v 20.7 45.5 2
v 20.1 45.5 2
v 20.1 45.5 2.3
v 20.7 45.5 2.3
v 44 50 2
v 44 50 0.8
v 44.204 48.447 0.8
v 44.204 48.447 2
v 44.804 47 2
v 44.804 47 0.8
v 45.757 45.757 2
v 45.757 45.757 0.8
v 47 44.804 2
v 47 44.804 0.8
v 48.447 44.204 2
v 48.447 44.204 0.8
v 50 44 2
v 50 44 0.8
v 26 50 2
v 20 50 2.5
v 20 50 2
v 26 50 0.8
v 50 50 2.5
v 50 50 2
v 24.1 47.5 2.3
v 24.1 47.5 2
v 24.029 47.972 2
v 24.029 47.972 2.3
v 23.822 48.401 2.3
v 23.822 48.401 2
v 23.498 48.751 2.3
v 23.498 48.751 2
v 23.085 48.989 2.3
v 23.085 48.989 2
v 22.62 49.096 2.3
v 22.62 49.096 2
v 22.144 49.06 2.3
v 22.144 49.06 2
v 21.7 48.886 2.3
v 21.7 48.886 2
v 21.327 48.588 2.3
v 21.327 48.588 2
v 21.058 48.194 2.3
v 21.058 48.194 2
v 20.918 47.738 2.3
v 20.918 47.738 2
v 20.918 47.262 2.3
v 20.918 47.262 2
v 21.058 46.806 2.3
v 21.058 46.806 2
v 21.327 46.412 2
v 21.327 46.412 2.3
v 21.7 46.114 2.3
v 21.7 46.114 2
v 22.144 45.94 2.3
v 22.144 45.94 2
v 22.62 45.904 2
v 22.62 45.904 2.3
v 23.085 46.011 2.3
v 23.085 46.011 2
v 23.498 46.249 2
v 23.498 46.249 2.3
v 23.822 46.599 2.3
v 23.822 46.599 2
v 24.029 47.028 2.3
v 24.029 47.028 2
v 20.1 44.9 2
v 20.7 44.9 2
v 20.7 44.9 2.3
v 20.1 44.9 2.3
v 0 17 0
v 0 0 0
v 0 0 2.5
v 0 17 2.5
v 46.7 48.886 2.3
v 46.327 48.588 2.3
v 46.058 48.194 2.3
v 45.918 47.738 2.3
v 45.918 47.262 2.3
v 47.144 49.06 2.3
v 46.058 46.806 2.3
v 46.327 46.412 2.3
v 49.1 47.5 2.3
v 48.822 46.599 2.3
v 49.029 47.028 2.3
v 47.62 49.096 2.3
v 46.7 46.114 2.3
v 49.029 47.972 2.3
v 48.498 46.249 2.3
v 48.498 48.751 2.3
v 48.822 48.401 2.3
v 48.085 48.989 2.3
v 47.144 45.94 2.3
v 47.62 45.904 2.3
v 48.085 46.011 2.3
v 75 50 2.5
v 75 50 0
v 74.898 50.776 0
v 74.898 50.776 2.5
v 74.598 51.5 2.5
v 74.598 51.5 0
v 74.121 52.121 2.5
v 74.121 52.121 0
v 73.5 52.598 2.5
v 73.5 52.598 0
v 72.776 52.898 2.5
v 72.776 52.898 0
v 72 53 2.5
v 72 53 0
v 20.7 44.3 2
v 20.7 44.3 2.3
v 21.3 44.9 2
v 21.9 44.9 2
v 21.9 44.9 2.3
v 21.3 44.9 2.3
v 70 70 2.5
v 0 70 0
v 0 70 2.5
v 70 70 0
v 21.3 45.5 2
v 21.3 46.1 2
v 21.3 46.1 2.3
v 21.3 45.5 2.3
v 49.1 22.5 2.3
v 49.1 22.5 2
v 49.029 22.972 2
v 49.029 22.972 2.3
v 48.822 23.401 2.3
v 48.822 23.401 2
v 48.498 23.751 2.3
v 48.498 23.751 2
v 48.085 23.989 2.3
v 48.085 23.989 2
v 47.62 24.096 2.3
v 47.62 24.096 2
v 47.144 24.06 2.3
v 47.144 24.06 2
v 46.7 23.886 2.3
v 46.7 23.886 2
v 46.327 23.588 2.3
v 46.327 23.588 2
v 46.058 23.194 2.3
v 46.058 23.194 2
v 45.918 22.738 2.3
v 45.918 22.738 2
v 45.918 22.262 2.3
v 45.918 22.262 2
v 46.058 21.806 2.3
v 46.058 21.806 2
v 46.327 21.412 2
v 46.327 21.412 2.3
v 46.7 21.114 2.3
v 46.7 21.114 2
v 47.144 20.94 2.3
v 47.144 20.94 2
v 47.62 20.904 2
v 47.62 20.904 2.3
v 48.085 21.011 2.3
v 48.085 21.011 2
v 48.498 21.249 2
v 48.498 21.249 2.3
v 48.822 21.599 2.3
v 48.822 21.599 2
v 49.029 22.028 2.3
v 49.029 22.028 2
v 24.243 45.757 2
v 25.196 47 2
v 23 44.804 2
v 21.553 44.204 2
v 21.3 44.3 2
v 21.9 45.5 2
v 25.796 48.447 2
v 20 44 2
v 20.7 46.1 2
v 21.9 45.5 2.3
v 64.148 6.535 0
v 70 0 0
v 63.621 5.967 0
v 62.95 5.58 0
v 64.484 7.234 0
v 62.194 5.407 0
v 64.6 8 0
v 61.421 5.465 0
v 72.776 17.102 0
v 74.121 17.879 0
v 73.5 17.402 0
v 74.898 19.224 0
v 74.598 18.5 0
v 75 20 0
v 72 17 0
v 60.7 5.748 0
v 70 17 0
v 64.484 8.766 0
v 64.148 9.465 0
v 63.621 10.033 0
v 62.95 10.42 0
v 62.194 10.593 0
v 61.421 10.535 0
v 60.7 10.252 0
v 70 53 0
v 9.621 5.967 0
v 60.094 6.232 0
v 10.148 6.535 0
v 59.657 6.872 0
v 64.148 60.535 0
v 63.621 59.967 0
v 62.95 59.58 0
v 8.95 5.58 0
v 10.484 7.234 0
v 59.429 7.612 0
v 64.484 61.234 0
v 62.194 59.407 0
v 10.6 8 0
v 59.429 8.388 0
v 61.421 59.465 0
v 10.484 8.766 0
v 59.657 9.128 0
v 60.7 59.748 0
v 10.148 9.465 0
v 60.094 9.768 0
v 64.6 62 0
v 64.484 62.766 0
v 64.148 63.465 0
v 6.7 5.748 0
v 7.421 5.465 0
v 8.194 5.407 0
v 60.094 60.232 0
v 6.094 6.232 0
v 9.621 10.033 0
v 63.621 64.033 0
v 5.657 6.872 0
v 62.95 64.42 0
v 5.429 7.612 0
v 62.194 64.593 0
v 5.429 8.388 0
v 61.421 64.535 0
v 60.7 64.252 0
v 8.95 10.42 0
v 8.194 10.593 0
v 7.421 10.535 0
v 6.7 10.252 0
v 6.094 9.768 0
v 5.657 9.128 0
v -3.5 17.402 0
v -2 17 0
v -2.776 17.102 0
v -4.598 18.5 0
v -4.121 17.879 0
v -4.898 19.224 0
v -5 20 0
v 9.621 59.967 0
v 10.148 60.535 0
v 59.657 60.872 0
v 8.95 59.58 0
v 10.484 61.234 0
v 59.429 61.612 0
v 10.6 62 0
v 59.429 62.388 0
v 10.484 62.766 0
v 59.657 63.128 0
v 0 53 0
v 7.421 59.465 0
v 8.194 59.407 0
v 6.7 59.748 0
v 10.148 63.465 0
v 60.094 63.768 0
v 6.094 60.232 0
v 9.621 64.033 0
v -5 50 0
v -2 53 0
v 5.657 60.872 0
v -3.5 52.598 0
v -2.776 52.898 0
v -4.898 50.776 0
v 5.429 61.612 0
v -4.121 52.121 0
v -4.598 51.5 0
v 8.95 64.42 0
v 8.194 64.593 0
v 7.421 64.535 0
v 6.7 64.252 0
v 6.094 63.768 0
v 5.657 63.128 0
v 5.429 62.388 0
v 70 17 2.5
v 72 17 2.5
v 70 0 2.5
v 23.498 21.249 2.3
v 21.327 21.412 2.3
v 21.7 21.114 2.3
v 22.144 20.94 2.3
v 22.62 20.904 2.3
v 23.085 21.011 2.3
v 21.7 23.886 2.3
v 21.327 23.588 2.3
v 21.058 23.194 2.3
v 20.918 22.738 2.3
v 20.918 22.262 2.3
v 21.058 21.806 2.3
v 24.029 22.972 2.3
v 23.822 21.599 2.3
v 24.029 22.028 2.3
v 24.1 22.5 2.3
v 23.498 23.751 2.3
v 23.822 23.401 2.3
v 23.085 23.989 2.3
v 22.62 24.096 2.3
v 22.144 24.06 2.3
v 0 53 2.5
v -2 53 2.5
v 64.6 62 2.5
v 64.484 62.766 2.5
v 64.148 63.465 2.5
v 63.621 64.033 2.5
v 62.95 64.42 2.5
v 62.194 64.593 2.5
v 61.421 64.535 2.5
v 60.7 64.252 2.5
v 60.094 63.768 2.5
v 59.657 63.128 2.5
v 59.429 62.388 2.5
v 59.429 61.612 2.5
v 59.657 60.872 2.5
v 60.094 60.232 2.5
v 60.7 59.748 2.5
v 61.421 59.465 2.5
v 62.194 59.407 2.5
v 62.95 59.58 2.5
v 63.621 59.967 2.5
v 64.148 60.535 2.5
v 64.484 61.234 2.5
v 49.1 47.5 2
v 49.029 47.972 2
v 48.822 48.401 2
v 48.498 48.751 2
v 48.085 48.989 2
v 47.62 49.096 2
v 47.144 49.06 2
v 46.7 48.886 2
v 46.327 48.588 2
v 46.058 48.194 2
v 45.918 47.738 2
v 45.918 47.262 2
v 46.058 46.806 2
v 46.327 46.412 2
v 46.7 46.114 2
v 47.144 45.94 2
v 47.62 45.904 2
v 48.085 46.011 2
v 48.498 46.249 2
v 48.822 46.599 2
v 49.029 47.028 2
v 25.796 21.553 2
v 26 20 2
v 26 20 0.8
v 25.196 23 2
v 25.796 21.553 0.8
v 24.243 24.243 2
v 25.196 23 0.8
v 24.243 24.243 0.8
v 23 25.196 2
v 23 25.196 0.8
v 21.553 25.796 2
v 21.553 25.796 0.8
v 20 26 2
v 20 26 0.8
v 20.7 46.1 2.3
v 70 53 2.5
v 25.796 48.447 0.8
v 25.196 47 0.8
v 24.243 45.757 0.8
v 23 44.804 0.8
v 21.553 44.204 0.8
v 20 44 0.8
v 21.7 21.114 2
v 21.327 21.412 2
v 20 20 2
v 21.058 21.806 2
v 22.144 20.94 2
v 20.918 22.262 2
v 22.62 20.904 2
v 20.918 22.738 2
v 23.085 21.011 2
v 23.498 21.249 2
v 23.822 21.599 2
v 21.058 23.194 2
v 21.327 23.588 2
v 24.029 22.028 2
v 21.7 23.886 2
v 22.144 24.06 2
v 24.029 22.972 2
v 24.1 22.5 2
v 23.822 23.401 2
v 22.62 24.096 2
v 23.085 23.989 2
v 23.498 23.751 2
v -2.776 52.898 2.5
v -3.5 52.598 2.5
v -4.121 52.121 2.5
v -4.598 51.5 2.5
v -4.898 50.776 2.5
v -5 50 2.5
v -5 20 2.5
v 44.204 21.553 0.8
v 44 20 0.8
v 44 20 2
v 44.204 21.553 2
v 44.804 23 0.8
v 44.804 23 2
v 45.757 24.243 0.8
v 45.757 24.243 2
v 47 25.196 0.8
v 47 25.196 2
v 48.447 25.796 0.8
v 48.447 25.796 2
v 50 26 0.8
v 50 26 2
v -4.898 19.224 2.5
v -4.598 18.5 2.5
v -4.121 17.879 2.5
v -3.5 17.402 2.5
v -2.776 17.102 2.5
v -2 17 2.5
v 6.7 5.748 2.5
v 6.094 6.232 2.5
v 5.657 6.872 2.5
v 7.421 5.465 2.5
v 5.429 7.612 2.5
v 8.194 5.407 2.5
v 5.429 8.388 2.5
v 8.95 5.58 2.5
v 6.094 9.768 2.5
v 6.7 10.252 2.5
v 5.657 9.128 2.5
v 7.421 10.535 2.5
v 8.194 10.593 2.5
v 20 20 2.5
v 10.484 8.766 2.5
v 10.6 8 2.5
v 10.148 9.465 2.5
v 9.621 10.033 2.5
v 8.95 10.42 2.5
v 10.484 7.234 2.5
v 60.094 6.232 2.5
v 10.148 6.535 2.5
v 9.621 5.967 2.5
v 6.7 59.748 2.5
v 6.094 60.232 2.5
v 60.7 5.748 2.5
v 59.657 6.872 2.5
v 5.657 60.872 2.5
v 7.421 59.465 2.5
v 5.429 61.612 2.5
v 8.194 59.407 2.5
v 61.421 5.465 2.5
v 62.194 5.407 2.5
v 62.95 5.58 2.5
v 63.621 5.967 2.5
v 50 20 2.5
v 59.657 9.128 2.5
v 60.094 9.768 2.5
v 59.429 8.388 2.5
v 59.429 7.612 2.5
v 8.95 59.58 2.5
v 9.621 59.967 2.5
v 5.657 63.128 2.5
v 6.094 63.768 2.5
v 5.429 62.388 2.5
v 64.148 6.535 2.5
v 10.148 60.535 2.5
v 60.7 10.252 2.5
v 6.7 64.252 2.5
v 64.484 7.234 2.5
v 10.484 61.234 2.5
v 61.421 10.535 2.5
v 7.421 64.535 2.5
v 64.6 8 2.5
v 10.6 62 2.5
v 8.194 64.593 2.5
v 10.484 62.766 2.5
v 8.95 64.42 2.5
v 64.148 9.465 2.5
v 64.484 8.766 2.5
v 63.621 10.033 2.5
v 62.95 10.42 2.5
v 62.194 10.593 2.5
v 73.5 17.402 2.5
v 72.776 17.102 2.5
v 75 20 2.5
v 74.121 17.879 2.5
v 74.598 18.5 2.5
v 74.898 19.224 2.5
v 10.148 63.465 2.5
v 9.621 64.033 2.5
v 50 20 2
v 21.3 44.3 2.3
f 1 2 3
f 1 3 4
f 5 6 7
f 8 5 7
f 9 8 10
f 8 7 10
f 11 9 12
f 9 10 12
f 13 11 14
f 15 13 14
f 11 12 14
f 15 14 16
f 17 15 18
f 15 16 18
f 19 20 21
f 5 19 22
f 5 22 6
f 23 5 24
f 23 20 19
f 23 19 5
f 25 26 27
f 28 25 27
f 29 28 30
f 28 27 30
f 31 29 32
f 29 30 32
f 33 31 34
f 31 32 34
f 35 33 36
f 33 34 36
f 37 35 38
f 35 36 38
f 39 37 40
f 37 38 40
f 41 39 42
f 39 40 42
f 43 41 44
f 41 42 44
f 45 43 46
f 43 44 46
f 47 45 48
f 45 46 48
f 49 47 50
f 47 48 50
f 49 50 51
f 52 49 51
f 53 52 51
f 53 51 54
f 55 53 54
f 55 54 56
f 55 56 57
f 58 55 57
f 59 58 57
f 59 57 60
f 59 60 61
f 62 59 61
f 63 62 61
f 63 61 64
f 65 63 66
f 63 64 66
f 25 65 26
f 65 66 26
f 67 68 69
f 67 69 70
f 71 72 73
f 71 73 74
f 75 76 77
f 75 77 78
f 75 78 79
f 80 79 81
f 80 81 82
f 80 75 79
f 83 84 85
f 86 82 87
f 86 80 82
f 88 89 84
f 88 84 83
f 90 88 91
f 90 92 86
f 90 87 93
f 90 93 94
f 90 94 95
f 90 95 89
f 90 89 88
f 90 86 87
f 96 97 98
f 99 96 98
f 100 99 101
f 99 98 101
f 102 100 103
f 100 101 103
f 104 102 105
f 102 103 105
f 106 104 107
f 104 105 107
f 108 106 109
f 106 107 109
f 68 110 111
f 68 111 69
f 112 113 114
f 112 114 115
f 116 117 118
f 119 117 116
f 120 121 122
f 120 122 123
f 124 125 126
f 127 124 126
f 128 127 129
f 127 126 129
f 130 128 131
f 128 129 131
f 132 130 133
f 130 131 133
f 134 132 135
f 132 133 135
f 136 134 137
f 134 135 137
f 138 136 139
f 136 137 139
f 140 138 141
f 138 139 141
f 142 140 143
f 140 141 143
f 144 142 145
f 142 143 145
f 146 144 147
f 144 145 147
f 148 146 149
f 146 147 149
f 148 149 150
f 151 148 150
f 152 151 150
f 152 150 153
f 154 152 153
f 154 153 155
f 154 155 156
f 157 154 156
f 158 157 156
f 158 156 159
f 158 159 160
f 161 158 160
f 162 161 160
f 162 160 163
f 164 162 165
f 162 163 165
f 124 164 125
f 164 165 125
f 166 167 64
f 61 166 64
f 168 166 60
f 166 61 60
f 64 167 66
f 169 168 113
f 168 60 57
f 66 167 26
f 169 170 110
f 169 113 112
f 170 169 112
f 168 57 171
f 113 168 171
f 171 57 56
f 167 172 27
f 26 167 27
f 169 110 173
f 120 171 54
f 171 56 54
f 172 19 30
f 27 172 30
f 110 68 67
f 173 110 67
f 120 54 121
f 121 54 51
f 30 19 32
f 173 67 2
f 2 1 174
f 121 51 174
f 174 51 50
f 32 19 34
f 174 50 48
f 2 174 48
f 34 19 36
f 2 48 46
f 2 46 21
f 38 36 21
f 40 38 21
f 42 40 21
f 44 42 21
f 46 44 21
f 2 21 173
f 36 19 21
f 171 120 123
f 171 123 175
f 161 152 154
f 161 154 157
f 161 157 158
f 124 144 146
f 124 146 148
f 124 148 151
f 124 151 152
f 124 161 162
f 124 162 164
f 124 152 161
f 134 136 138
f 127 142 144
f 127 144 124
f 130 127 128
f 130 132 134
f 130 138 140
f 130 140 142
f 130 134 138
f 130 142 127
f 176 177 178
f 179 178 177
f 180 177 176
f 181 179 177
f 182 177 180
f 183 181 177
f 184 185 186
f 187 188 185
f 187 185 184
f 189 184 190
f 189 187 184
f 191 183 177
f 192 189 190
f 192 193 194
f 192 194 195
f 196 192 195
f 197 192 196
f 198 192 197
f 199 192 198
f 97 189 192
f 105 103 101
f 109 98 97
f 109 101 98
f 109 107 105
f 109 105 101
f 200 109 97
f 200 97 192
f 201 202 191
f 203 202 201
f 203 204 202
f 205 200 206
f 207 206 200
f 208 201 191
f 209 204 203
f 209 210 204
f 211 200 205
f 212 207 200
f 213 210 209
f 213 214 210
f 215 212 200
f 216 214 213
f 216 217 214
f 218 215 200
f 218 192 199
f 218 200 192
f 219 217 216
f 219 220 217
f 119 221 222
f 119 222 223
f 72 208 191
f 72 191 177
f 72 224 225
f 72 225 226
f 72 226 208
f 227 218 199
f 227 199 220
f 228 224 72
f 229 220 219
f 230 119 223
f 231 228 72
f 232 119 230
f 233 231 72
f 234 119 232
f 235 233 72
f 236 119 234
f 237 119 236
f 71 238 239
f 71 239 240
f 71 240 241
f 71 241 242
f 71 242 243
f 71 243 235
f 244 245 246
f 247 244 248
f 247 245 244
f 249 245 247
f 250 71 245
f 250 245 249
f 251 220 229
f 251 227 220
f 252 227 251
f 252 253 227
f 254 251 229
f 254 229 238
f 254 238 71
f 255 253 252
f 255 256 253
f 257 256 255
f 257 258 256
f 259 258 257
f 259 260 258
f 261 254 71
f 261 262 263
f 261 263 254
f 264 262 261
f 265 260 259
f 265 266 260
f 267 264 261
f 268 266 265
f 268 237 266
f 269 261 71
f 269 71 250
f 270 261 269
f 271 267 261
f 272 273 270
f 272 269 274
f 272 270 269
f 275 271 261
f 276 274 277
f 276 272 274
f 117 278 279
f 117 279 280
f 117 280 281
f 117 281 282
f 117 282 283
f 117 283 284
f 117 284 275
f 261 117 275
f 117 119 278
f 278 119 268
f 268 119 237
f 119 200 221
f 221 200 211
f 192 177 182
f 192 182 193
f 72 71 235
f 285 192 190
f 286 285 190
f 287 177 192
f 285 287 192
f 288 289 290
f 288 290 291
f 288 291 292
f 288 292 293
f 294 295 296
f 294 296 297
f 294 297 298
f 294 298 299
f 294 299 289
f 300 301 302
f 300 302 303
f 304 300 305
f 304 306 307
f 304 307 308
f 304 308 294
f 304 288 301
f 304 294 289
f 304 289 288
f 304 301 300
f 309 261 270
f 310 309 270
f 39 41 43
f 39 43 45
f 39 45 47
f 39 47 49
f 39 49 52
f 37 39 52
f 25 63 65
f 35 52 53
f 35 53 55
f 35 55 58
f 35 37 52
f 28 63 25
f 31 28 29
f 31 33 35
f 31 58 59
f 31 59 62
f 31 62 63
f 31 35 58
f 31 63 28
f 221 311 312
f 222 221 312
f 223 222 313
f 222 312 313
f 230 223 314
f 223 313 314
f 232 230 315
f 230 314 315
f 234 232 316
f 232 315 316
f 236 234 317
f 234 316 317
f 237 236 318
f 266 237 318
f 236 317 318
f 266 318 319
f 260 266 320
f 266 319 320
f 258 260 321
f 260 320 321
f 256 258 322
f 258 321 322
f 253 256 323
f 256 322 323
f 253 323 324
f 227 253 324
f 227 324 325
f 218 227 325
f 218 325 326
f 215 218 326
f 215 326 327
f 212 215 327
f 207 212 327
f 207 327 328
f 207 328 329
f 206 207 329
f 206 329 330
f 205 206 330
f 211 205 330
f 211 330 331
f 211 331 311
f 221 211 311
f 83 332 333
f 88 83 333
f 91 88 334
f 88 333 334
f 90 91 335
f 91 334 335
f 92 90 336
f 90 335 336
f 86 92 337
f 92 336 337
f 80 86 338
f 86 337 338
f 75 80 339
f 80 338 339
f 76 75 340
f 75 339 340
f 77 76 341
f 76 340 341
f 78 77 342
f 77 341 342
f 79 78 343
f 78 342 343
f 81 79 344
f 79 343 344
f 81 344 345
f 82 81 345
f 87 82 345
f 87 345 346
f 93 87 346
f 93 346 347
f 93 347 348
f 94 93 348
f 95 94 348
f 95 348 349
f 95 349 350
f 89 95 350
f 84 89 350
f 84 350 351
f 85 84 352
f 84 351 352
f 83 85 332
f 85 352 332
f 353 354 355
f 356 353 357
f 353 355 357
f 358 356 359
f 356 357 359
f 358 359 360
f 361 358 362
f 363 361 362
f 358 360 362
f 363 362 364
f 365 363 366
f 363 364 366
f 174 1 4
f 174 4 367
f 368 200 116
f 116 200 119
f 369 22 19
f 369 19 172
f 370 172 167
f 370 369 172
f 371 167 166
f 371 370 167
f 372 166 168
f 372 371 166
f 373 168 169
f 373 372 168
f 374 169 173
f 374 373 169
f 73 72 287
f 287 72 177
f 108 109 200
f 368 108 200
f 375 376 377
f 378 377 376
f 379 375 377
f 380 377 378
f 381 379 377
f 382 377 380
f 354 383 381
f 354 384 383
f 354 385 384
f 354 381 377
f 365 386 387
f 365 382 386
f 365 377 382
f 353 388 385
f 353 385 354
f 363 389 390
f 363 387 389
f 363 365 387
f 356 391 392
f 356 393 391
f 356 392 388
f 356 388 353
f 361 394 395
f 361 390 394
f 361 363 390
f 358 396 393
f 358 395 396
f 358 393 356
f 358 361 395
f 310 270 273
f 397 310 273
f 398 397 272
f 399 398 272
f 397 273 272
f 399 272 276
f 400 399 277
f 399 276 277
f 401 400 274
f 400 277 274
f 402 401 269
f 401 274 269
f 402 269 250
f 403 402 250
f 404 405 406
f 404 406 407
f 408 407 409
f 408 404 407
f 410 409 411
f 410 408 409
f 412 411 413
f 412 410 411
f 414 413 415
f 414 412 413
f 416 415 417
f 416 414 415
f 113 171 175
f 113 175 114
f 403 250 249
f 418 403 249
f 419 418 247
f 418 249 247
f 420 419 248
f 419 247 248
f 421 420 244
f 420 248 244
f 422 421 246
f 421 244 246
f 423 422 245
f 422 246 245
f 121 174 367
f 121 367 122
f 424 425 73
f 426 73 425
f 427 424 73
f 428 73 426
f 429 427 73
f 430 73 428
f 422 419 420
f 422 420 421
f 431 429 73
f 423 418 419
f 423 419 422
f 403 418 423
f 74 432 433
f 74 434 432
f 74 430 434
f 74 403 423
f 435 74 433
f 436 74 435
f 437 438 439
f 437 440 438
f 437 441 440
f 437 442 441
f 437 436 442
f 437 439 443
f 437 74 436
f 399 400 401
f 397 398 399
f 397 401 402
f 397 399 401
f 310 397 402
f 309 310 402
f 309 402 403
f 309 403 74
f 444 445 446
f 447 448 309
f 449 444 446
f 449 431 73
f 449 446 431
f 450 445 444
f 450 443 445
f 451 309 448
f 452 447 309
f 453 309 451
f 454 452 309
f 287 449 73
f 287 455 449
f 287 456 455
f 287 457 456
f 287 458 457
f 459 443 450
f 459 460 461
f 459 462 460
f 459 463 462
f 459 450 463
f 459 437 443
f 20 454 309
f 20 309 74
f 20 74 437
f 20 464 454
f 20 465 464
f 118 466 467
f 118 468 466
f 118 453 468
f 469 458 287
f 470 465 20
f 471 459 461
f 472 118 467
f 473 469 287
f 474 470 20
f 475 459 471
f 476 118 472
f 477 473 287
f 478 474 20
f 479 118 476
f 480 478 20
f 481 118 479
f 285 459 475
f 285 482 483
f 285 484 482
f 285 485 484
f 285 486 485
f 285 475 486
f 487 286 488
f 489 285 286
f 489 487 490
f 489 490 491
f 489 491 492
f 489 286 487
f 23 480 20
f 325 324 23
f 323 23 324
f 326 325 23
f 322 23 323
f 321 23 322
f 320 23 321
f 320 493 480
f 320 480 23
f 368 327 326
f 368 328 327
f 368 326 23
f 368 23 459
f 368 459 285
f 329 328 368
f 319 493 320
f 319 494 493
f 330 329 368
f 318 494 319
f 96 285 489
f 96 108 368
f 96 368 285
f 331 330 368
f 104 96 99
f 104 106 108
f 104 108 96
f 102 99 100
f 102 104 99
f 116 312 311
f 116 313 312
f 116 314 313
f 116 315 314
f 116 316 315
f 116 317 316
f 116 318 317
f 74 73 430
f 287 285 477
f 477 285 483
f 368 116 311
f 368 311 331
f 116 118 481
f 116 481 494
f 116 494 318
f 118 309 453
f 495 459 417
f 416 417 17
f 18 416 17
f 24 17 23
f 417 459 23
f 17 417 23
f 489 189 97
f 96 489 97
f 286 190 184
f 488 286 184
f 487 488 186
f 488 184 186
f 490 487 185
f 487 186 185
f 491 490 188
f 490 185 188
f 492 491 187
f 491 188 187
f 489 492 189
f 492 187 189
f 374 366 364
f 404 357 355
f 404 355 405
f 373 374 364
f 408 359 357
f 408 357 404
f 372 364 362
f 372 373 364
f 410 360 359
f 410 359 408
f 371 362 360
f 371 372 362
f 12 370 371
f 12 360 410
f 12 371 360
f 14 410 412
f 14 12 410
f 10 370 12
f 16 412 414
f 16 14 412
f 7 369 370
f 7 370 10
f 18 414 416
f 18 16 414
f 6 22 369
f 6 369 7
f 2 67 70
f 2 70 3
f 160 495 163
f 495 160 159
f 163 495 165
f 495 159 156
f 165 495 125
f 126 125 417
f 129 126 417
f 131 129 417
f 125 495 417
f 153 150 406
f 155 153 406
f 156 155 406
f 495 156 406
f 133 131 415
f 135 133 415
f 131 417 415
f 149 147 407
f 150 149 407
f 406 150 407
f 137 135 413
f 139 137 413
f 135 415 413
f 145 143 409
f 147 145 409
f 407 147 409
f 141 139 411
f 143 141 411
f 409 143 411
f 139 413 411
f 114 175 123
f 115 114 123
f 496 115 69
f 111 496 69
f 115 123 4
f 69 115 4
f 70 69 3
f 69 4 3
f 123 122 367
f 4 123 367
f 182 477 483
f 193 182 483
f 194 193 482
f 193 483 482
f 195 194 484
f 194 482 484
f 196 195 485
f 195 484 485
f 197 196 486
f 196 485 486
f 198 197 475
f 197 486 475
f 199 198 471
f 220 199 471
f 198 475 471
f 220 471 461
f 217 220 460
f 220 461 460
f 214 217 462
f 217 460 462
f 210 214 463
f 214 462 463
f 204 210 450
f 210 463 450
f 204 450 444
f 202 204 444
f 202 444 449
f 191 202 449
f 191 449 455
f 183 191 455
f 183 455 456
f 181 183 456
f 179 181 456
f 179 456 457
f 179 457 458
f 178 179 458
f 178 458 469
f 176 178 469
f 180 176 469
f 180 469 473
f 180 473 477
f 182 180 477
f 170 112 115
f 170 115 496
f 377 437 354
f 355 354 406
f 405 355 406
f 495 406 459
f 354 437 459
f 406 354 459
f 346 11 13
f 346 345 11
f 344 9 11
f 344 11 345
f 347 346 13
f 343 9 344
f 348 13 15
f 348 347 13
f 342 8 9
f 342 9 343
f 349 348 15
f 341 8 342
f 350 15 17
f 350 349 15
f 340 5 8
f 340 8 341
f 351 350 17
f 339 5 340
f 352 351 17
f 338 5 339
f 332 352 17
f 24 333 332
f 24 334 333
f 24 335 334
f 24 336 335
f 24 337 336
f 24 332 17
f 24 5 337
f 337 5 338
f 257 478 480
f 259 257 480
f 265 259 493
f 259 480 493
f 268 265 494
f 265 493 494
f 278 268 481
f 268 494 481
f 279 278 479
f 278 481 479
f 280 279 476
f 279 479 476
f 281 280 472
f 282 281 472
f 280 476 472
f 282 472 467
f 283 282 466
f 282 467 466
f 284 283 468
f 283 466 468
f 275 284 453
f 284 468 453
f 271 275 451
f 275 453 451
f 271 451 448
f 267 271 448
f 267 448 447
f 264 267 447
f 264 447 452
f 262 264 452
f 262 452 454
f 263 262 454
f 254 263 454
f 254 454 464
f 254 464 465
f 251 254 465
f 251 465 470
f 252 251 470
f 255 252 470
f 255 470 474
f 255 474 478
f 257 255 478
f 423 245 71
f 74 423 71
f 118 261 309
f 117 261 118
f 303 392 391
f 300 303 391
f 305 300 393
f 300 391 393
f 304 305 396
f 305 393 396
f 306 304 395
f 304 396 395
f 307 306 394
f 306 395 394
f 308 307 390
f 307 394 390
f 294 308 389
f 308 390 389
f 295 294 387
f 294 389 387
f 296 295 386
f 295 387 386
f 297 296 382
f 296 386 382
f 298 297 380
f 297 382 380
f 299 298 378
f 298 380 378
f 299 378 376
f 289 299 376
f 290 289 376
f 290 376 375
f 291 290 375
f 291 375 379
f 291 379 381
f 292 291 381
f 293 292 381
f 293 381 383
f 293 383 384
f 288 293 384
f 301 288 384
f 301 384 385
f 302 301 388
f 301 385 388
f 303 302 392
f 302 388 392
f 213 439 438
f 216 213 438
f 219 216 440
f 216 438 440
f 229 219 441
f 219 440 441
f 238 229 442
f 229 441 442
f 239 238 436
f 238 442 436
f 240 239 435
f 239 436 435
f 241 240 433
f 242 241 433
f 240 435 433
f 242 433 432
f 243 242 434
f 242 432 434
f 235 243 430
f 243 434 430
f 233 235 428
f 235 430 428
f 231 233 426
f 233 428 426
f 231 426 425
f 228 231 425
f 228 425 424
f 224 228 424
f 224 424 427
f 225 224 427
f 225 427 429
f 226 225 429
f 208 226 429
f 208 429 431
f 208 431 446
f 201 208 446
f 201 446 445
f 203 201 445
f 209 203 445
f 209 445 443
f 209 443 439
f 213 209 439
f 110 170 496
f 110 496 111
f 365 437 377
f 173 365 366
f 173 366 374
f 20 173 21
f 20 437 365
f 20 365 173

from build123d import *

# Parameters (mm, degrees)
SKETCH_1_W          = 70
SKETCH_1_H          = 70
EXTRUDE_1_DEPTH     = 2.5
SKETCH_2_W          = 30
SKETCH_2_H          = 30
CUT_EXTRUDE_1_DEPTH = 1.7
SKETCH_3_R          = 2.6
CUT_EXTRUDE_2_DEPTH = 3
EXTRUDE_2_DEPTH     = 2
SKETCH_6_R          = 1.6
EXTRUDE_3_DEPTH     = 0.3


with BuildPart() as part:
    # 草图1 → 凸台-拉伸1 (new body)
    with BuildSketch(Plane.XY):
        with BuildLine():
            Line((-2, 17), (0, 17))
            Line((0, 17), (0, 53))
            Line((0, 53), (-2, 53))
            ThreePointArc((-2, 53), (-4.121320344, 52.121320344), (-5, 50))
            Line((-5, 50), (-5, 20))
            ThreePointArc((-5, 20), (-4.121320344, 17.878679656), (-2, 17))
        make_face()
        with Locations((35, 35)):
            Rectangle(SKETCH_1_W, SKETCH_1_H)
        with BuildLine():
            Line((70, 53), (70, 17))
            Line((70, 17), (72, 17))
            ThreePointArc((72, 17), (74.121320344, 17.878679656), (75, 20))
            Line((75, 20), (75, 50))
            ThreePointArc((75, 50), (74.121320344, 52.121320344), (72, 53))
            Line((72, 53), (70, 53))
        make_face()
    extrude(amount=EXTRUDE_1_DEPTH)

    # 草图2 → 切除-拉伸1 (cut)
    with BuildSketch(Plane.XY.offset(2.5)):
        with Locations((35, 35)):
            Rectangle(SKETCH_2_W, SKETCH_2_H)
    extrude(amount=-CUT_EXTRUDE_1_DEPTH, mode=Mode.SUBTRACT)

    # 草图3 → 切除-拉伸2 (cut)
    with BuildSketch(Plane.XY.offset(2.5)):
        with Locations((8, 62)):
            Circle(SKETCH_3_R)
        with Locations((62, 62)):
            Circle(SKETCH_3_R)
        with Locations((8, 8)):
            Circle(SKETCH_3_R)
        with Locations((62, 8)):
            Circle(SKETCH_3_R)
    extrude(amount=-CUT_EXTRUDE_2_DEPTH, mode=Mode.SUBTRACT)

    # 草图4 → 凸台-拉伸2 (add)
    with BuildSketch(Plane.XY):
        with BuildLine():
            Line((20, 44), (20, 50))
            Line((20, 50), (26, 50))
            ThreePointArc((26, 50), (24.242640687, 45.757359313), (20, 44))
        make_face()
        with BuildLine():
            Line((50, 44), (50, 50))
            Line((50, 50), (44, 50))
            ThreePointArc((44, 50), (45.757359313, 45.757359313), (50, 44))
        make_face()
        with BuildLine():
            Line((50, 20), (44, 20))
            ThreePointArc((44, 20), (45.757359313, 24.242640687), (50, 26))
            Line((50, 26), (50, 20))
        make_face()
        with BuildLine():
            Line((20, 26), (20, 20))
            Line((20, 20), (26, 20))
            ThreePointArc((26, 20), (24.242640687, 24.242640687), (20, 26))
        make_face()
    extrude(amount=EXTRUDE_2_DEPTH)

    # 草图6 → 凸台-拉伸3 (add)
    with BuildSketch(Plane.XY.offset(2)):
        with Locations((22.5, 47.5)):
            Circle(SKETCH_6_R)
        with Locations((47.5, 47.5)):
            Circle(SKETCH_6_R)
        with Locations((47.5, 22.5)):
            Circle(SKETCH_6_R)
        with Locations((22.5, 22.5)):
            Circle(SKETCH_6_R)
        Polygon((20.1, 45.5), (20.7, 45.5), (20.7, 46.1), (21.3, 46.1), (21.3, 45.5), (21.9, 45.5), (21.9, 44.9), (21.3, 44.9), (21.3, 44.3), (20.7, 44.3), (20.7, 44.9), (20.1, 44.9), align=None)
    extrude(amount=EXTRUDE_3_DEPTH)


solid = part.part
